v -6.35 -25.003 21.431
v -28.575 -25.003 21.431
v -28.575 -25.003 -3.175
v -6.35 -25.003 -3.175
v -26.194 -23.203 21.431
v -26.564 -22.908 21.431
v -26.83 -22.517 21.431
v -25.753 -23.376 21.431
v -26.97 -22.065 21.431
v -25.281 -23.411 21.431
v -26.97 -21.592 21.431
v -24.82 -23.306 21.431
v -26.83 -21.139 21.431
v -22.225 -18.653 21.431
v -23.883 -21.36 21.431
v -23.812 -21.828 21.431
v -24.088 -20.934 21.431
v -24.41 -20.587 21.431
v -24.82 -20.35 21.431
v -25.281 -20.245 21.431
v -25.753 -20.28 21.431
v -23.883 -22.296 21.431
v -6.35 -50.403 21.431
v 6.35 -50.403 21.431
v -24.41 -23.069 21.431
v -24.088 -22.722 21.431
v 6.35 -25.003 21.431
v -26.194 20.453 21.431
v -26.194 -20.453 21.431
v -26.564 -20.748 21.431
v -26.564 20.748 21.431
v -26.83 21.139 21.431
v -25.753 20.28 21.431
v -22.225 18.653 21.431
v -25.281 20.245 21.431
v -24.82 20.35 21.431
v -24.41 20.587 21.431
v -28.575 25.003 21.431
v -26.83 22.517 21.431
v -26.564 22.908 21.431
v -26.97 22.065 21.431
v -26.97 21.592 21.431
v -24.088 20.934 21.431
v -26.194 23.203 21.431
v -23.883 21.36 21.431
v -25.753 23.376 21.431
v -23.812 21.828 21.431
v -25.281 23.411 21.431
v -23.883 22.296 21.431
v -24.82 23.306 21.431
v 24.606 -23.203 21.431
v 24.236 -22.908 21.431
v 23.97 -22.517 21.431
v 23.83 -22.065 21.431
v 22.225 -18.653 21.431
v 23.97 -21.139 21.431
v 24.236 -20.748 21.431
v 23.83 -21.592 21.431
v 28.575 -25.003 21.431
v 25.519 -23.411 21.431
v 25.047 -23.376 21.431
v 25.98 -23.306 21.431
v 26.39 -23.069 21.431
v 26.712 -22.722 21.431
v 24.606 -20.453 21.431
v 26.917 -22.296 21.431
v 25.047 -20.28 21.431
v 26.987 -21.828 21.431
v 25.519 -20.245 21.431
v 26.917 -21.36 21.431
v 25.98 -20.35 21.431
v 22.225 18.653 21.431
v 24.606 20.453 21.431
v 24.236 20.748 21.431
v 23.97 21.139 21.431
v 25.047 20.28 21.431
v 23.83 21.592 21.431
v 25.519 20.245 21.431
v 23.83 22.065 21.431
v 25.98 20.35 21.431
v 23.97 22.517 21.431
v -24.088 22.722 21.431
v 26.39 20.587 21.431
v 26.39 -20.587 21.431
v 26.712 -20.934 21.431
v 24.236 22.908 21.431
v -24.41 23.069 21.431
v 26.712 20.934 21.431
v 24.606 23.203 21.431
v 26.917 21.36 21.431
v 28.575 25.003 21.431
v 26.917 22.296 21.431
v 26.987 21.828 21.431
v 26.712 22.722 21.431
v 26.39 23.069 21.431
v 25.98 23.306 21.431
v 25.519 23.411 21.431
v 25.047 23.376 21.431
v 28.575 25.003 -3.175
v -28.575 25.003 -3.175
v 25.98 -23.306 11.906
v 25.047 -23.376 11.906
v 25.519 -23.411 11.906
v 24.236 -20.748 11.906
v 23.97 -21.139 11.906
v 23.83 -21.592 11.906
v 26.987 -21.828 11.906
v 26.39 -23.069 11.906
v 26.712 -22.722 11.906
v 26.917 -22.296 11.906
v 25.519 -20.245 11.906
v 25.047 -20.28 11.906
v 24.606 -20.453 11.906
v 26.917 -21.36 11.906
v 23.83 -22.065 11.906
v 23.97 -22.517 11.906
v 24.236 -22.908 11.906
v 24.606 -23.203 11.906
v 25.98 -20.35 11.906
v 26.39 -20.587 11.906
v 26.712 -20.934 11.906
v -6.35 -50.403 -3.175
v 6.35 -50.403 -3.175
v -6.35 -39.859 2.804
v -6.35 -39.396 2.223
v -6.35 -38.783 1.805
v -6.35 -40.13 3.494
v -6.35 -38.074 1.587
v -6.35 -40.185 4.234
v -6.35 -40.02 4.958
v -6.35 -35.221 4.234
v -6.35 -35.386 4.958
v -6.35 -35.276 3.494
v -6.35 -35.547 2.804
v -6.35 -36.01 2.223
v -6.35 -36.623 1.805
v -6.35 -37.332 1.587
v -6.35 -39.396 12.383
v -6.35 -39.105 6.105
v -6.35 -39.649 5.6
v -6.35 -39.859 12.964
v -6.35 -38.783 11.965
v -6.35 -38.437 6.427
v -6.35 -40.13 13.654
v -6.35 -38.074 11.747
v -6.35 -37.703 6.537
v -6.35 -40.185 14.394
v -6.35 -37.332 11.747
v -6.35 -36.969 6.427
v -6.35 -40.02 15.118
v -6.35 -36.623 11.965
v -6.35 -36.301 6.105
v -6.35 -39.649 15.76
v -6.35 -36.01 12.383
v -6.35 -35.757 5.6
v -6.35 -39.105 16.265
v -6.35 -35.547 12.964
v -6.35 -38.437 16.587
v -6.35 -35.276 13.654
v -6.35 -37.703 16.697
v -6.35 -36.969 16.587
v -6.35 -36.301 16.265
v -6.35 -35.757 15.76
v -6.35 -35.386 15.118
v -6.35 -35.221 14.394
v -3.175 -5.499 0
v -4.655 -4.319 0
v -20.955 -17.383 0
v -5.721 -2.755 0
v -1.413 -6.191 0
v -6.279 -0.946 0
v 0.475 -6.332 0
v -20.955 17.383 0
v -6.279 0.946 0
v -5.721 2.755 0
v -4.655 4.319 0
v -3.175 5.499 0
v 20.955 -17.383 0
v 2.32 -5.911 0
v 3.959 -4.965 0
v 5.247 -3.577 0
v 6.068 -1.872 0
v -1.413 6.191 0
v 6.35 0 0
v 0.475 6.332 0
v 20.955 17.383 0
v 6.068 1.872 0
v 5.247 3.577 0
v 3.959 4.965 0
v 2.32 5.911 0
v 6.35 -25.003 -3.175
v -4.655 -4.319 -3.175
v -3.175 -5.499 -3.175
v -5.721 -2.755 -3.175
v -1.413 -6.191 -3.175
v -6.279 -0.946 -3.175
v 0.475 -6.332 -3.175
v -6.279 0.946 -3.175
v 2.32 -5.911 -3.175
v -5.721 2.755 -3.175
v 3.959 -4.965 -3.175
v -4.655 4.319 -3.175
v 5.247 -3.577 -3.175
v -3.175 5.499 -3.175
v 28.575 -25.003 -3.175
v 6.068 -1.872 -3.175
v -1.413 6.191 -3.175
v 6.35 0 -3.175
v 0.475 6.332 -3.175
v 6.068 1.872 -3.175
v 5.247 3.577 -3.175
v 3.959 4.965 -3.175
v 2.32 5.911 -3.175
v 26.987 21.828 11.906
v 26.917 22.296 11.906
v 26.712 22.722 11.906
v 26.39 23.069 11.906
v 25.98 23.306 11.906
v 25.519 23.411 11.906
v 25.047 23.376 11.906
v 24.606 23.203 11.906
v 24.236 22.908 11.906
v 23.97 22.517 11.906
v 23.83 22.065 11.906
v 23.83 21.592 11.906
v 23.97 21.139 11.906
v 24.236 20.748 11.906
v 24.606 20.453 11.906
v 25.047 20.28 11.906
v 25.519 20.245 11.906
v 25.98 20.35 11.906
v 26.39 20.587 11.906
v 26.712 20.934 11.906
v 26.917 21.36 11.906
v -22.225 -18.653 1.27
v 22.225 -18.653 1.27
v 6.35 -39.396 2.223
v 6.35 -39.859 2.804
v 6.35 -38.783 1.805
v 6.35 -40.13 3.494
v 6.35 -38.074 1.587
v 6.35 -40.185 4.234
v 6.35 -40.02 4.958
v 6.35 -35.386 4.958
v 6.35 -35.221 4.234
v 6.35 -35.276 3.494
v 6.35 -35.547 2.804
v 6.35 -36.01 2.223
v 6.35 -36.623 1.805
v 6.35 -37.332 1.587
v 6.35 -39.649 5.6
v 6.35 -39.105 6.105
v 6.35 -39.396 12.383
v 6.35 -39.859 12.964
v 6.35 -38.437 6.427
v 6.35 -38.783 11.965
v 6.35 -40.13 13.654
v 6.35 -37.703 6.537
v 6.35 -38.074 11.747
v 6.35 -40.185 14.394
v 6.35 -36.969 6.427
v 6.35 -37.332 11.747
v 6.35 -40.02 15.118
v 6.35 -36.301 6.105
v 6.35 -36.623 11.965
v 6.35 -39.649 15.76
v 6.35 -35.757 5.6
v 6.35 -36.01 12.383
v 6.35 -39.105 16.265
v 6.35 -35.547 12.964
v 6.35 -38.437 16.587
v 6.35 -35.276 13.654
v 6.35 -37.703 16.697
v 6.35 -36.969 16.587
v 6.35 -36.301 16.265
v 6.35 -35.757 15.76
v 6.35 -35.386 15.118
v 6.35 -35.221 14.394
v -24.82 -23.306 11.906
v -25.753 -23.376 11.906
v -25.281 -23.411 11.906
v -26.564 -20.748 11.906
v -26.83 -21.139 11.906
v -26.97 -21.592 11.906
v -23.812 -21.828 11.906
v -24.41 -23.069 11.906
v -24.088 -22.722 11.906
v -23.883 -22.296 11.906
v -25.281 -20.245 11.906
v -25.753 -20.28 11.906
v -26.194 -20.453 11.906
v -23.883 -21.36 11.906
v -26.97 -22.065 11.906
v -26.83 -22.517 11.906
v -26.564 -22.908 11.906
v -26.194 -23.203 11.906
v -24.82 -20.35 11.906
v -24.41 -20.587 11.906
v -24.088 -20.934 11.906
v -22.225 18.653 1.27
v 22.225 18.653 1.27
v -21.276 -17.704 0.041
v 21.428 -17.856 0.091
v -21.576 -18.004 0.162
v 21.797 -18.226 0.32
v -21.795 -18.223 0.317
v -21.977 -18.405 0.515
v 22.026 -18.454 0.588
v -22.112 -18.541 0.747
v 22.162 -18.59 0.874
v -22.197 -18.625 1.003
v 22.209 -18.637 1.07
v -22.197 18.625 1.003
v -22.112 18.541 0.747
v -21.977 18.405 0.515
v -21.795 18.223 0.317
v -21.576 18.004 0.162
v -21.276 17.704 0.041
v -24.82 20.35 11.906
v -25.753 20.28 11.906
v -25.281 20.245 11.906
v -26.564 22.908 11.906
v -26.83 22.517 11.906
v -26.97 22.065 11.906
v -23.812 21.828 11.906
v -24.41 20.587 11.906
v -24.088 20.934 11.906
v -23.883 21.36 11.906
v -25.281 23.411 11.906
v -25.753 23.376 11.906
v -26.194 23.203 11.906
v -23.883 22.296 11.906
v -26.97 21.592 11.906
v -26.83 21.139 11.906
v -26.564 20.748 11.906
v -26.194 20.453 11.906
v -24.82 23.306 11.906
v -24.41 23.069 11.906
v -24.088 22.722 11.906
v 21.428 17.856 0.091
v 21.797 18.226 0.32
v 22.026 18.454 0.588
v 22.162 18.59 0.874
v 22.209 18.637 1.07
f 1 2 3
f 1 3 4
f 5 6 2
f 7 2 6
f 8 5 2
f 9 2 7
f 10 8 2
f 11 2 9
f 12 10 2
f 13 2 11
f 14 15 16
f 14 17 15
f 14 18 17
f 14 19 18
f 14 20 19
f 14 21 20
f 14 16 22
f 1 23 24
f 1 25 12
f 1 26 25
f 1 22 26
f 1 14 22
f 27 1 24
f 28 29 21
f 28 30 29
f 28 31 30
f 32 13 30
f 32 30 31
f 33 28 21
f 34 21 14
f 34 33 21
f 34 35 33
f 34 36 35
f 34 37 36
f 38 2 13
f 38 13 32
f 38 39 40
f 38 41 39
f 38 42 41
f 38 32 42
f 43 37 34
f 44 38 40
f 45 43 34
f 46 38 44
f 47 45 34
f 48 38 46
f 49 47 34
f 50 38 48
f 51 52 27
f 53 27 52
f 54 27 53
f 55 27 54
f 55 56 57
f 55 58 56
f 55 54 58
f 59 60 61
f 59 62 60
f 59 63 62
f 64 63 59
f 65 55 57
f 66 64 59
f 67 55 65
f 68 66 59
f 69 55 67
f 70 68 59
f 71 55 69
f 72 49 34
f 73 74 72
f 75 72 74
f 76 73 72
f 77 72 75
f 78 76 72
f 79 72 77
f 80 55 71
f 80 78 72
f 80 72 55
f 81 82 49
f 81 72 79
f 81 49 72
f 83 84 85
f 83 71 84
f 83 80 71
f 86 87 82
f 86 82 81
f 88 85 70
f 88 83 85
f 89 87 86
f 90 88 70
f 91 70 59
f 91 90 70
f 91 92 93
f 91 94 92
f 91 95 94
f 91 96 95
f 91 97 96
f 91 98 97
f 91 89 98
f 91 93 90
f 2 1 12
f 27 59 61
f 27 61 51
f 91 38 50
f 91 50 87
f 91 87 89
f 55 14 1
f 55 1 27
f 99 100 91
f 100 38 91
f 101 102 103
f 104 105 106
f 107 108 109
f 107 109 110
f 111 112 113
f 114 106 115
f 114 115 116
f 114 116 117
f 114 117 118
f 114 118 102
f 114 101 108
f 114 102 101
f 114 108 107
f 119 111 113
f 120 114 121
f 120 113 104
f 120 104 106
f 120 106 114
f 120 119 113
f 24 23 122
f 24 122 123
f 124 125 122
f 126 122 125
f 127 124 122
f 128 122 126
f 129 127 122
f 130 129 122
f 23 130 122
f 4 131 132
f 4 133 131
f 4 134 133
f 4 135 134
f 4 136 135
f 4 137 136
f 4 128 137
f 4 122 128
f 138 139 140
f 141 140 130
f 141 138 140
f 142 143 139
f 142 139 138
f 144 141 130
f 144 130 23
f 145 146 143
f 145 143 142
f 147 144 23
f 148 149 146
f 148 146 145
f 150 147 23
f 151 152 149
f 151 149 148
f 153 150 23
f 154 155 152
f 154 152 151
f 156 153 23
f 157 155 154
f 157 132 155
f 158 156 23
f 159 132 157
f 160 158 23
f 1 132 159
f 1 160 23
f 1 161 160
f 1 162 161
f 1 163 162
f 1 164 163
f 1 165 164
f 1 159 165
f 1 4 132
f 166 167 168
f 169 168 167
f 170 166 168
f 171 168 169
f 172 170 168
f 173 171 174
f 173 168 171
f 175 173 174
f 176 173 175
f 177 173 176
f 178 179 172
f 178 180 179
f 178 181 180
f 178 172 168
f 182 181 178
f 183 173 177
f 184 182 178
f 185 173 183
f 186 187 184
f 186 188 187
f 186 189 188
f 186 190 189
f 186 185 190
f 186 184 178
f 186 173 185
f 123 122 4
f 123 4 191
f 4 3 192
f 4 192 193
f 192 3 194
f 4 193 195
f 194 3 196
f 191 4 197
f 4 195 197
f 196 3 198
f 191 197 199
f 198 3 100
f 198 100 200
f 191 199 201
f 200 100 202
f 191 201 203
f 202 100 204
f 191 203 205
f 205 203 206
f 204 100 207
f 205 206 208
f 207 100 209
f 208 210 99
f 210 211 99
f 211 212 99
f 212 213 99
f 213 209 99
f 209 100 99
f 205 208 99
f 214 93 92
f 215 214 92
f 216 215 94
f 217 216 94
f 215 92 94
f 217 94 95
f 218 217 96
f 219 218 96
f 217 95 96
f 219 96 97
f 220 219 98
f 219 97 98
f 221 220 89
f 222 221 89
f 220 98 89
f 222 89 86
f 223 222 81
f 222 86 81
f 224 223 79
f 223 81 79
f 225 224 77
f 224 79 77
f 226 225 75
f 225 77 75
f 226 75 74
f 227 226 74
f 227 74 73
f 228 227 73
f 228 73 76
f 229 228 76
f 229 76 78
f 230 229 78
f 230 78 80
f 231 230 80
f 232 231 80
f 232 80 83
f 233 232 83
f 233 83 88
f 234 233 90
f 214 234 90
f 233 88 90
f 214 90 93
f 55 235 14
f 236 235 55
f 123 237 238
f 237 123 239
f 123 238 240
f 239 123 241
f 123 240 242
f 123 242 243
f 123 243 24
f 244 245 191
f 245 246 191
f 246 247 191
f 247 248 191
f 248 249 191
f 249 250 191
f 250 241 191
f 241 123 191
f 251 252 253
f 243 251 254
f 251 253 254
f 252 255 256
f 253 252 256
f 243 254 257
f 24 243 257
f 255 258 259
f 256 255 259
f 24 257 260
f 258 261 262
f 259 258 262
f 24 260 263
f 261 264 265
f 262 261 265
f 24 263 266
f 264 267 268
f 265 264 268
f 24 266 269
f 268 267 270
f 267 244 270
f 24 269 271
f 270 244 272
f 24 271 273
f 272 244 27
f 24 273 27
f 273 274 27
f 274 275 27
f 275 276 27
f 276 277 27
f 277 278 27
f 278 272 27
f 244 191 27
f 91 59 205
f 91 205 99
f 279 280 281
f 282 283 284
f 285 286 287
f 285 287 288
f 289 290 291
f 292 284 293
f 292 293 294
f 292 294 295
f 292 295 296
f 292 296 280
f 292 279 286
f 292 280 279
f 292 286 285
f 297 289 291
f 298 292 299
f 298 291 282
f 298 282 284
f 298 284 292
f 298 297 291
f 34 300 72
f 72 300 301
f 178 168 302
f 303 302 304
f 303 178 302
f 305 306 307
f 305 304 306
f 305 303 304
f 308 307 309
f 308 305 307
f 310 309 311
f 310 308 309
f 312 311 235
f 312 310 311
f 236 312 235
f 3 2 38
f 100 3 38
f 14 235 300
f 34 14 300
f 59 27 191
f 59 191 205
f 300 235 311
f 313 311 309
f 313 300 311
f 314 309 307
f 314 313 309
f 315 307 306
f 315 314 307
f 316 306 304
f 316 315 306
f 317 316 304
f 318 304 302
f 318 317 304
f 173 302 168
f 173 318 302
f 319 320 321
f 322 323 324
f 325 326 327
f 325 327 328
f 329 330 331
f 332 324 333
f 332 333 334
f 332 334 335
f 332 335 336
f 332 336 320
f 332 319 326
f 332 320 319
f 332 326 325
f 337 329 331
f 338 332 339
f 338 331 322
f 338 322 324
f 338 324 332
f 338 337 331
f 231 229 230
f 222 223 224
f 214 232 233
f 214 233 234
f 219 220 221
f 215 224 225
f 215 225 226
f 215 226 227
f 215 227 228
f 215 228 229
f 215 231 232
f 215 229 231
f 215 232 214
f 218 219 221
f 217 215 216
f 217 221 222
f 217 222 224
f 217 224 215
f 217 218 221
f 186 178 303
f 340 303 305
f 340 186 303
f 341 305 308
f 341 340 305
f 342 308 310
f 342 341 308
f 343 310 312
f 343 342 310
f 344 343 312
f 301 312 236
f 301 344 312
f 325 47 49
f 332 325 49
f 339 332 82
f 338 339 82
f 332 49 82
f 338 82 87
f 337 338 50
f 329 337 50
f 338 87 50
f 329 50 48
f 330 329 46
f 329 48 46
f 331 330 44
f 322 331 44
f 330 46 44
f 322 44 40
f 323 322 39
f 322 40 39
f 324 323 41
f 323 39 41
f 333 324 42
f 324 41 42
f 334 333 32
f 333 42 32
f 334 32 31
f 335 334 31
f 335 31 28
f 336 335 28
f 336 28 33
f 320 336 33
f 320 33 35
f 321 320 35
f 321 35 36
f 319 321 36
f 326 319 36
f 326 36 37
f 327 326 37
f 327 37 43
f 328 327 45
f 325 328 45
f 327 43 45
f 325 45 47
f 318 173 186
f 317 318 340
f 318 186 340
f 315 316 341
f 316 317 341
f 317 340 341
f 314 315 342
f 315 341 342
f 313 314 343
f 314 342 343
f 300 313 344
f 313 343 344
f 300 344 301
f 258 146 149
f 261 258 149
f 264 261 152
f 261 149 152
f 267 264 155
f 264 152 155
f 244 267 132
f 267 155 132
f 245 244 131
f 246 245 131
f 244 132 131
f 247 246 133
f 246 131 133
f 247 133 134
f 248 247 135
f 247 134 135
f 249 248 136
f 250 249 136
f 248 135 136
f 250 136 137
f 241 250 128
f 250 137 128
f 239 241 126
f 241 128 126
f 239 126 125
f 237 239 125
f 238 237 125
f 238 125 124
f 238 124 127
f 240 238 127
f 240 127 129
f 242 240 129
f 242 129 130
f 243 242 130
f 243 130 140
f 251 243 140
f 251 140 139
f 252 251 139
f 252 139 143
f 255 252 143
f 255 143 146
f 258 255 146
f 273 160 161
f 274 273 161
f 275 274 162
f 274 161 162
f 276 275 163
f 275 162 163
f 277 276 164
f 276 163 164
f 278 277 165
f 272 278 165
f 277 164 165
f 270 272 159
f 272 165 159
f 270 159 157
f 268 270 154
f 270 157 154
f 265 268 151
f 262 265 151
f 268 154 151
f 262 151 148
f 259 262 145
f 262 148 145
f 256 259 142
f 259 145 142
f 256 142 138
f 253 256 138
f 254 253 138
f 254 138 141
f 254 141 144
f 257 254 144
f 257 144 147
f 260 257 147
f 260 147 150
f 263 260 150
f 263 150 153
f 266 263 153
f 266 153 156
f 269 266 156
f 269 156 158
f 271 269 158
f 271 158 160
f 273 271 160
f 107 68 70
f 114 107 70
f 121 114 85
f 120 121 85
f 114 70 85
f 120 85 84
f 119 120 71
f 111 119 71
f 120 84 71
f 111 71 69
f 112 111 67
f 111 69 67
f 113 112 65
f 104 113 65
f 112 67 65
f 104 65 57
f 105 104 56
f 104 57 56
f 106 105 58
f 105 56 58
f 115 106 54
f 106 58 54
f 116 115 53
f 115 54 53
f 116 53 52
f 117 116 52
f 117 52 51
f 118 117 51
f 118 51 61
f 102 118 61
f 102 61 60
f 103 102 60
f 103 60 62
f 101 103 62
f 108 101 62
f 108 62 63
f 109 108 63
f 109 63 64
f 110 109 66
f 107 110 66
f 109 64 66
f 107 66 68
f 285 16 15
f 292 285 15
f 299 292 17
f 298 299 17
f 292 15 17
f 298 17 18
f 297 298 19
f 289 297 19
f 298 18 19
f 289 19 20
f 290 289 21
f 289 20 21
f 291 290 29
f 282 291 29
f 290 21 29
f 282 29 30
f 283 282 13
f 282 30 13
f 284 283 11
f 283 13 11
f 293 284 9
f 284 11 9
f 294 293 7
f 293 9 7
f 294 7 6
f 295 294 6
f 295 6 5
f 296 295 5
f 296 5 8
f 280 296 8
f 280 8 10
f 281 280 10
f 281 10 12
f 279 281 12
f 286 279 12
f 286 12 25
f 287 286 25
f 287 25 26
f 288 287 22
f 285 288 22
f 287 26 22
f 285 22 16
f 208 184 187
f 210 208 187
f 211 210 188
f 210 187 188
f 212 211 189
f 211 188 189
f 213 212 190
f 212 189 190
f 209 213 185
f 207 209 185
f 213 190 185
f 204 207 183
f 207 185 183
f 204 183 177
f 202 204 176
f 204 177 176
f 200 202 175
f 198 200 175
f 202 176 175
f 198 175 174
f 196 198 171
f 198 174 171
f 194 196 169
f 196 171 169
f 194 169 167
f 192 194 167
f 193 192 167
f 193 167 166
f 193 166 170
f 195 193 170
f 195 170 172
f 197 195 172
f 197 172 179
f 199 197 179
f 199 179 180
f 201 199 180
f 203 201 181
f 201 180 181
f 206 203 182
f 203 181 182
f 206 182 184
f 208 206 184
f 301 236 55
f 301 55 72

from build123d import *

# Parameters (mm, degrees)
SKETCH1_W           = 57.15
SKETCH1_H           = 50.00625
SKETCH1_W_2         = 44.45
SKETCH1_H_2         = 37.30625
BOSS_EXTRUDE1_DEPTH = 21.43125
SKETCH2_W           = 57.15
SKETCH2_H           = 50.00625
SKETCH2_R           = 6.35
BOSS_EXTRUDE2_DEPTH = 3.175
FILLET1_R           = 1.27
SKETCH6_R           = 1.5875
CUT_EXTRUDE2_DEPTH  = 9.525
SKETCH7_W           = 12.7
SKETCH7_H           = 24.60625
BOSS_EXTRUDE3_DEPTH = 25.4
CUT_EXTRUDE3_REACH  = 66.958
SKETCH8_R           = 2.4892


with BuildPart() as part:
    # Sketch1 → Boss-Extrude1 (new body)
    with BuildSketch(Plane.XY):
        Rectangle(SKETCH1_W, SKETCH1_H)
        Rectangle(SKETCH1_W_2, SKETCH1_H_2, mode=Mode.SUBTRACT)
    extrude(amount=BOSS_EXTRUDE1_DEPTH)

    # Sketch2 → Boss-Extrude2 (add)
    with BuildSketch(Plane.XY):
        Rectangle(SKETCH2_W, SKETCH2_H)
        Circle(SKETCH2_R, mode=Mode.SUBTRACT)
    extrude(amount=-BOSS_EXTRUDE2_DEPTH)

    # Fillet1
    fillet1_edges = [part.edges().sort_by_distance(p)[0] for p in [
        (-22.225, 0, 0),
        (0, -18.653125, 0),
        (22.225, 0, 0),
        (0, 18.653125, 0),
    ]]
    fillet(fillet1_edges, radius=FILLET1_R)

    # Sketch6 → Cut-Extrude2 (cut)
    with BuildSketch(Plane.XY.offset(21.43125)):
        with Locations((-25.4, 21.828125)):
            Circle(SKETCH6_R)
        with Locations((25.4, 21.828125)):
            Circle(SKETCH6_R)
        with Locations((25.4, -21.828125)):
            Circle(SKETCH6_R)
        with Locations((-25.4, -21.828125)):
            Circle(SKETCH6_R)
    extrude(amount=-CUT_EXTRUDE2_DEPTH, mode=Mode.SUBTRACT)

    # Sketch7 → Boss-Extrude3 (add)
    with BuildSketch(Plane.XZ.offset(25.003125)):
        with Locations((0, 9.128125)):
            Rectangle(SKETCH7_W, SKETCH7_H)
    extrude(amount=BOSS_EXTRUDE3_DEPTH)

    # Sketch8 → Cut-Extrude3 (cut, up to next)
    with BuildSketch(Plane.ZY.offset(6.35), mode=Mode.PRIVATE) as cut_extrude3_sk1:
        with Locations((4.048125, -37.703125)):
            Circle(SKETCH8_R)
    cut_extrude3_tool1 = extrude(cut_extrude3_sk1.sketch, amount=-CUT_EXTRUDE3_REACH, mode=Mode.PRIVATE) & part.part
    # Sketch8 → Cut-Extrude3 (cut, up to next)
    with BuildSketch(Plane.ZY.offset(6.35), mode=Mode.PRIVATE) as cut_extrude3_sk2:
        with Locations((14.208125, -37.703125)):
            Circle(SKETCH8_R)
    cut_extrude3_tool2 = extrude(cut_extrude3_sk2.sketch, amount=-CUT_EXTRUDE3_REACH, mode=Mode.PRIVATE) & part.part
    add(cut_extrude3_tool1.solids().sort_by_distance((-6.35, -37.703125, 4.048125))[0], mode=Mode.SUBTRACT)
    add(cut_extrude3_tool2.solids().sort_by_distance((-6.35, -37.703125, 14.208125))[0], mode=Mode.SUBTRACT)


solid = part.part
